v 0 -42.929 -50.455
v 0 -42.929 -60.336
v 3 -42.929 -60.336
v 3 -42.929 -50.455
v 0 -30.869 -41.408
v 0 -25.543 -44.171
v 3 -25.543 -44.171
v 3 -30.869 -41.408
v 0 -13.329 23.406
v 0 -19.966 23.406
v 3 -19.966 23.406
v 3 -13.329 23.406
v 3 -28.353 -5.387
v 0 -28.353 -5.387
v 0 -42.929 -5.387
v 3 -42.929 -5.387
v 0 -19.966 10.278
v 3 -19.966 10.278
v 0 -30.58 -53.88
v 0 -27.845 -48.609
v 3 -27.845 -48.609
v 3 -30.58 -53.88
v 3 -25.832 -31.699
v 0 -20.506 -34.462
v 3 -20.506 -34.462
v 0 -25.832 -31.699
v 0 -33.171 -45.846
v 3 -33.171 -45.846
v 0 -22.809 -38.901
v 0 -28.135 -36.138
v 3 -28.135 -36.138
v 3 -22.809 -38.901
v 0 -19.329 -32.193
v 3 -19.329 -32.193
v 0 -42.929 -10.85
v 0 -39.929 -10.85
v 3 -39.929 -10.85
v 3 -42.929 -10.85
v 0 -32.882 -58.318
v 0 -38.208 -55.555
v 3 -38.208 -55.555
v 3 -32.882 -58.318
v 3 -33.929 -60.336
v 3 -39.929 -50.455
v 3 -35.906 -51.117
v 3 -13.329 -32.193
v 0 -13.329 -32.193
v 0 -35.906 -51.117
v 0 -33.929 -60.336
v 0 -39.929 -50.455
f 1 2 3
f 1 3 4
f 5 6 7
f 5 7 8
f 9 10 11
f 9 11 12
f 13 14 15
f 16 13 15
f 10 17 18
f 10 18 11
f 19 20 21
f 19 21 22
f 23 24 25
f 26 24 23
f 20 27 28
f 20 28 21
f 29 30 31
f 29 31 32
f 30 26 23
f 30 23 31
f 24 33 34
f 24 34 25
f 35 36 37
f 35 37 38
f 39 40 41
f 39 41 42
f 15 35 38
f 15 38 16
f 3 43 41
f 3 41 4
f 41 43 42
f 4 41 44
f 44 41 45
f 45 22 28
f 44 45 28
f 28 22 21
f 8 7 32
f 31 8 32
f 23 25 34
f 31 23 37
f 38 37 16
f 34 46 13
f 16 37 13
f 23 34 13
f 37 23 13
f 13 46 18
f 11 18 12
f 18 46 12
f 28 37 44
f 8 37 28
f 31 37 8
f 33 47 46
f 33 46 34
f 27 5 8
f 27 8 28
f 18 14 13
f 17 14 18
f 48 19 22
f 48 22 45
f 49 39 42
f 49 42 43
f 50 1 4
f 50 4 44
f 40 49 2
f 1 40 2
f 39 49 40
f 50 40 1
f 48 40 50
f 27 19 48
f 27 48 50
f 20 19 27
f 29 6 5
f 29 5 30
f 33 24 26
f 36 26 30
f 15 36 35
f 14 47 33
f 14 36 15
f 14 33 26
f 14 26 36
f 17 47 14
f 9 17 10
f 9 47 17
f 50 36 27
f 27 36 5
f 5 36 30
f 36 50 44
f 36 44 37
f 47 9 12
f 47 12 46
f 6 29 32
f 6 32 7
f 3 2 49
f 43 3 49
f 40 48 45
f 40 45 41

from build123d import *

# Parameters (mm, degrees)
BOSS_EXTRUDE1_DEPTH = 3


with BuildPart() as part:
    # Sketch1 → Boss-Extrude1 (new body)
    with BuildSketch(Plane(origin=(0, 0, 0), x_dir=(0, 0, -1), z_dir=(1, 0, 0))):
        Polygon((-23.405592815, -13.328738611), (32.192831055, -13.328738611), (32.192831055, -19.328738611), (34.462282484, -20.506092894), (31.699266712, -25.832042935), (36.137558413, -28.134556078), (38.900574185, -22.808606037), (44.171084966, -25.542860827), (41.408069194, -30.868810868), (45.846360891, -33.17132401), (48.609376663, -27.845373968), (53.879887443, -30.579628758), (51.116871671, -35.9055788), (55.555163369, -38.208091941), (58.318179141, -32.8821419), (60.336210887, -33.929063763), (60.336210887, -39.929063763), (60.336210887, -42.929063763), (50.45453087, -42.929063763), (50.45453087, -39.929063763), (10.850026953, -39.929063763), (10.850026953, -42.929063763), (5.387336757, -42.929063763), (5.387336757, -39.929063763), (5.387336757, -28.352747539), (-10.278235861, -19.965608879), (-23.405592815, -19.965608879), align=None)
    extrude(amount=BOSS_EXTRUDE1_DEPTH)


solid = part.part
